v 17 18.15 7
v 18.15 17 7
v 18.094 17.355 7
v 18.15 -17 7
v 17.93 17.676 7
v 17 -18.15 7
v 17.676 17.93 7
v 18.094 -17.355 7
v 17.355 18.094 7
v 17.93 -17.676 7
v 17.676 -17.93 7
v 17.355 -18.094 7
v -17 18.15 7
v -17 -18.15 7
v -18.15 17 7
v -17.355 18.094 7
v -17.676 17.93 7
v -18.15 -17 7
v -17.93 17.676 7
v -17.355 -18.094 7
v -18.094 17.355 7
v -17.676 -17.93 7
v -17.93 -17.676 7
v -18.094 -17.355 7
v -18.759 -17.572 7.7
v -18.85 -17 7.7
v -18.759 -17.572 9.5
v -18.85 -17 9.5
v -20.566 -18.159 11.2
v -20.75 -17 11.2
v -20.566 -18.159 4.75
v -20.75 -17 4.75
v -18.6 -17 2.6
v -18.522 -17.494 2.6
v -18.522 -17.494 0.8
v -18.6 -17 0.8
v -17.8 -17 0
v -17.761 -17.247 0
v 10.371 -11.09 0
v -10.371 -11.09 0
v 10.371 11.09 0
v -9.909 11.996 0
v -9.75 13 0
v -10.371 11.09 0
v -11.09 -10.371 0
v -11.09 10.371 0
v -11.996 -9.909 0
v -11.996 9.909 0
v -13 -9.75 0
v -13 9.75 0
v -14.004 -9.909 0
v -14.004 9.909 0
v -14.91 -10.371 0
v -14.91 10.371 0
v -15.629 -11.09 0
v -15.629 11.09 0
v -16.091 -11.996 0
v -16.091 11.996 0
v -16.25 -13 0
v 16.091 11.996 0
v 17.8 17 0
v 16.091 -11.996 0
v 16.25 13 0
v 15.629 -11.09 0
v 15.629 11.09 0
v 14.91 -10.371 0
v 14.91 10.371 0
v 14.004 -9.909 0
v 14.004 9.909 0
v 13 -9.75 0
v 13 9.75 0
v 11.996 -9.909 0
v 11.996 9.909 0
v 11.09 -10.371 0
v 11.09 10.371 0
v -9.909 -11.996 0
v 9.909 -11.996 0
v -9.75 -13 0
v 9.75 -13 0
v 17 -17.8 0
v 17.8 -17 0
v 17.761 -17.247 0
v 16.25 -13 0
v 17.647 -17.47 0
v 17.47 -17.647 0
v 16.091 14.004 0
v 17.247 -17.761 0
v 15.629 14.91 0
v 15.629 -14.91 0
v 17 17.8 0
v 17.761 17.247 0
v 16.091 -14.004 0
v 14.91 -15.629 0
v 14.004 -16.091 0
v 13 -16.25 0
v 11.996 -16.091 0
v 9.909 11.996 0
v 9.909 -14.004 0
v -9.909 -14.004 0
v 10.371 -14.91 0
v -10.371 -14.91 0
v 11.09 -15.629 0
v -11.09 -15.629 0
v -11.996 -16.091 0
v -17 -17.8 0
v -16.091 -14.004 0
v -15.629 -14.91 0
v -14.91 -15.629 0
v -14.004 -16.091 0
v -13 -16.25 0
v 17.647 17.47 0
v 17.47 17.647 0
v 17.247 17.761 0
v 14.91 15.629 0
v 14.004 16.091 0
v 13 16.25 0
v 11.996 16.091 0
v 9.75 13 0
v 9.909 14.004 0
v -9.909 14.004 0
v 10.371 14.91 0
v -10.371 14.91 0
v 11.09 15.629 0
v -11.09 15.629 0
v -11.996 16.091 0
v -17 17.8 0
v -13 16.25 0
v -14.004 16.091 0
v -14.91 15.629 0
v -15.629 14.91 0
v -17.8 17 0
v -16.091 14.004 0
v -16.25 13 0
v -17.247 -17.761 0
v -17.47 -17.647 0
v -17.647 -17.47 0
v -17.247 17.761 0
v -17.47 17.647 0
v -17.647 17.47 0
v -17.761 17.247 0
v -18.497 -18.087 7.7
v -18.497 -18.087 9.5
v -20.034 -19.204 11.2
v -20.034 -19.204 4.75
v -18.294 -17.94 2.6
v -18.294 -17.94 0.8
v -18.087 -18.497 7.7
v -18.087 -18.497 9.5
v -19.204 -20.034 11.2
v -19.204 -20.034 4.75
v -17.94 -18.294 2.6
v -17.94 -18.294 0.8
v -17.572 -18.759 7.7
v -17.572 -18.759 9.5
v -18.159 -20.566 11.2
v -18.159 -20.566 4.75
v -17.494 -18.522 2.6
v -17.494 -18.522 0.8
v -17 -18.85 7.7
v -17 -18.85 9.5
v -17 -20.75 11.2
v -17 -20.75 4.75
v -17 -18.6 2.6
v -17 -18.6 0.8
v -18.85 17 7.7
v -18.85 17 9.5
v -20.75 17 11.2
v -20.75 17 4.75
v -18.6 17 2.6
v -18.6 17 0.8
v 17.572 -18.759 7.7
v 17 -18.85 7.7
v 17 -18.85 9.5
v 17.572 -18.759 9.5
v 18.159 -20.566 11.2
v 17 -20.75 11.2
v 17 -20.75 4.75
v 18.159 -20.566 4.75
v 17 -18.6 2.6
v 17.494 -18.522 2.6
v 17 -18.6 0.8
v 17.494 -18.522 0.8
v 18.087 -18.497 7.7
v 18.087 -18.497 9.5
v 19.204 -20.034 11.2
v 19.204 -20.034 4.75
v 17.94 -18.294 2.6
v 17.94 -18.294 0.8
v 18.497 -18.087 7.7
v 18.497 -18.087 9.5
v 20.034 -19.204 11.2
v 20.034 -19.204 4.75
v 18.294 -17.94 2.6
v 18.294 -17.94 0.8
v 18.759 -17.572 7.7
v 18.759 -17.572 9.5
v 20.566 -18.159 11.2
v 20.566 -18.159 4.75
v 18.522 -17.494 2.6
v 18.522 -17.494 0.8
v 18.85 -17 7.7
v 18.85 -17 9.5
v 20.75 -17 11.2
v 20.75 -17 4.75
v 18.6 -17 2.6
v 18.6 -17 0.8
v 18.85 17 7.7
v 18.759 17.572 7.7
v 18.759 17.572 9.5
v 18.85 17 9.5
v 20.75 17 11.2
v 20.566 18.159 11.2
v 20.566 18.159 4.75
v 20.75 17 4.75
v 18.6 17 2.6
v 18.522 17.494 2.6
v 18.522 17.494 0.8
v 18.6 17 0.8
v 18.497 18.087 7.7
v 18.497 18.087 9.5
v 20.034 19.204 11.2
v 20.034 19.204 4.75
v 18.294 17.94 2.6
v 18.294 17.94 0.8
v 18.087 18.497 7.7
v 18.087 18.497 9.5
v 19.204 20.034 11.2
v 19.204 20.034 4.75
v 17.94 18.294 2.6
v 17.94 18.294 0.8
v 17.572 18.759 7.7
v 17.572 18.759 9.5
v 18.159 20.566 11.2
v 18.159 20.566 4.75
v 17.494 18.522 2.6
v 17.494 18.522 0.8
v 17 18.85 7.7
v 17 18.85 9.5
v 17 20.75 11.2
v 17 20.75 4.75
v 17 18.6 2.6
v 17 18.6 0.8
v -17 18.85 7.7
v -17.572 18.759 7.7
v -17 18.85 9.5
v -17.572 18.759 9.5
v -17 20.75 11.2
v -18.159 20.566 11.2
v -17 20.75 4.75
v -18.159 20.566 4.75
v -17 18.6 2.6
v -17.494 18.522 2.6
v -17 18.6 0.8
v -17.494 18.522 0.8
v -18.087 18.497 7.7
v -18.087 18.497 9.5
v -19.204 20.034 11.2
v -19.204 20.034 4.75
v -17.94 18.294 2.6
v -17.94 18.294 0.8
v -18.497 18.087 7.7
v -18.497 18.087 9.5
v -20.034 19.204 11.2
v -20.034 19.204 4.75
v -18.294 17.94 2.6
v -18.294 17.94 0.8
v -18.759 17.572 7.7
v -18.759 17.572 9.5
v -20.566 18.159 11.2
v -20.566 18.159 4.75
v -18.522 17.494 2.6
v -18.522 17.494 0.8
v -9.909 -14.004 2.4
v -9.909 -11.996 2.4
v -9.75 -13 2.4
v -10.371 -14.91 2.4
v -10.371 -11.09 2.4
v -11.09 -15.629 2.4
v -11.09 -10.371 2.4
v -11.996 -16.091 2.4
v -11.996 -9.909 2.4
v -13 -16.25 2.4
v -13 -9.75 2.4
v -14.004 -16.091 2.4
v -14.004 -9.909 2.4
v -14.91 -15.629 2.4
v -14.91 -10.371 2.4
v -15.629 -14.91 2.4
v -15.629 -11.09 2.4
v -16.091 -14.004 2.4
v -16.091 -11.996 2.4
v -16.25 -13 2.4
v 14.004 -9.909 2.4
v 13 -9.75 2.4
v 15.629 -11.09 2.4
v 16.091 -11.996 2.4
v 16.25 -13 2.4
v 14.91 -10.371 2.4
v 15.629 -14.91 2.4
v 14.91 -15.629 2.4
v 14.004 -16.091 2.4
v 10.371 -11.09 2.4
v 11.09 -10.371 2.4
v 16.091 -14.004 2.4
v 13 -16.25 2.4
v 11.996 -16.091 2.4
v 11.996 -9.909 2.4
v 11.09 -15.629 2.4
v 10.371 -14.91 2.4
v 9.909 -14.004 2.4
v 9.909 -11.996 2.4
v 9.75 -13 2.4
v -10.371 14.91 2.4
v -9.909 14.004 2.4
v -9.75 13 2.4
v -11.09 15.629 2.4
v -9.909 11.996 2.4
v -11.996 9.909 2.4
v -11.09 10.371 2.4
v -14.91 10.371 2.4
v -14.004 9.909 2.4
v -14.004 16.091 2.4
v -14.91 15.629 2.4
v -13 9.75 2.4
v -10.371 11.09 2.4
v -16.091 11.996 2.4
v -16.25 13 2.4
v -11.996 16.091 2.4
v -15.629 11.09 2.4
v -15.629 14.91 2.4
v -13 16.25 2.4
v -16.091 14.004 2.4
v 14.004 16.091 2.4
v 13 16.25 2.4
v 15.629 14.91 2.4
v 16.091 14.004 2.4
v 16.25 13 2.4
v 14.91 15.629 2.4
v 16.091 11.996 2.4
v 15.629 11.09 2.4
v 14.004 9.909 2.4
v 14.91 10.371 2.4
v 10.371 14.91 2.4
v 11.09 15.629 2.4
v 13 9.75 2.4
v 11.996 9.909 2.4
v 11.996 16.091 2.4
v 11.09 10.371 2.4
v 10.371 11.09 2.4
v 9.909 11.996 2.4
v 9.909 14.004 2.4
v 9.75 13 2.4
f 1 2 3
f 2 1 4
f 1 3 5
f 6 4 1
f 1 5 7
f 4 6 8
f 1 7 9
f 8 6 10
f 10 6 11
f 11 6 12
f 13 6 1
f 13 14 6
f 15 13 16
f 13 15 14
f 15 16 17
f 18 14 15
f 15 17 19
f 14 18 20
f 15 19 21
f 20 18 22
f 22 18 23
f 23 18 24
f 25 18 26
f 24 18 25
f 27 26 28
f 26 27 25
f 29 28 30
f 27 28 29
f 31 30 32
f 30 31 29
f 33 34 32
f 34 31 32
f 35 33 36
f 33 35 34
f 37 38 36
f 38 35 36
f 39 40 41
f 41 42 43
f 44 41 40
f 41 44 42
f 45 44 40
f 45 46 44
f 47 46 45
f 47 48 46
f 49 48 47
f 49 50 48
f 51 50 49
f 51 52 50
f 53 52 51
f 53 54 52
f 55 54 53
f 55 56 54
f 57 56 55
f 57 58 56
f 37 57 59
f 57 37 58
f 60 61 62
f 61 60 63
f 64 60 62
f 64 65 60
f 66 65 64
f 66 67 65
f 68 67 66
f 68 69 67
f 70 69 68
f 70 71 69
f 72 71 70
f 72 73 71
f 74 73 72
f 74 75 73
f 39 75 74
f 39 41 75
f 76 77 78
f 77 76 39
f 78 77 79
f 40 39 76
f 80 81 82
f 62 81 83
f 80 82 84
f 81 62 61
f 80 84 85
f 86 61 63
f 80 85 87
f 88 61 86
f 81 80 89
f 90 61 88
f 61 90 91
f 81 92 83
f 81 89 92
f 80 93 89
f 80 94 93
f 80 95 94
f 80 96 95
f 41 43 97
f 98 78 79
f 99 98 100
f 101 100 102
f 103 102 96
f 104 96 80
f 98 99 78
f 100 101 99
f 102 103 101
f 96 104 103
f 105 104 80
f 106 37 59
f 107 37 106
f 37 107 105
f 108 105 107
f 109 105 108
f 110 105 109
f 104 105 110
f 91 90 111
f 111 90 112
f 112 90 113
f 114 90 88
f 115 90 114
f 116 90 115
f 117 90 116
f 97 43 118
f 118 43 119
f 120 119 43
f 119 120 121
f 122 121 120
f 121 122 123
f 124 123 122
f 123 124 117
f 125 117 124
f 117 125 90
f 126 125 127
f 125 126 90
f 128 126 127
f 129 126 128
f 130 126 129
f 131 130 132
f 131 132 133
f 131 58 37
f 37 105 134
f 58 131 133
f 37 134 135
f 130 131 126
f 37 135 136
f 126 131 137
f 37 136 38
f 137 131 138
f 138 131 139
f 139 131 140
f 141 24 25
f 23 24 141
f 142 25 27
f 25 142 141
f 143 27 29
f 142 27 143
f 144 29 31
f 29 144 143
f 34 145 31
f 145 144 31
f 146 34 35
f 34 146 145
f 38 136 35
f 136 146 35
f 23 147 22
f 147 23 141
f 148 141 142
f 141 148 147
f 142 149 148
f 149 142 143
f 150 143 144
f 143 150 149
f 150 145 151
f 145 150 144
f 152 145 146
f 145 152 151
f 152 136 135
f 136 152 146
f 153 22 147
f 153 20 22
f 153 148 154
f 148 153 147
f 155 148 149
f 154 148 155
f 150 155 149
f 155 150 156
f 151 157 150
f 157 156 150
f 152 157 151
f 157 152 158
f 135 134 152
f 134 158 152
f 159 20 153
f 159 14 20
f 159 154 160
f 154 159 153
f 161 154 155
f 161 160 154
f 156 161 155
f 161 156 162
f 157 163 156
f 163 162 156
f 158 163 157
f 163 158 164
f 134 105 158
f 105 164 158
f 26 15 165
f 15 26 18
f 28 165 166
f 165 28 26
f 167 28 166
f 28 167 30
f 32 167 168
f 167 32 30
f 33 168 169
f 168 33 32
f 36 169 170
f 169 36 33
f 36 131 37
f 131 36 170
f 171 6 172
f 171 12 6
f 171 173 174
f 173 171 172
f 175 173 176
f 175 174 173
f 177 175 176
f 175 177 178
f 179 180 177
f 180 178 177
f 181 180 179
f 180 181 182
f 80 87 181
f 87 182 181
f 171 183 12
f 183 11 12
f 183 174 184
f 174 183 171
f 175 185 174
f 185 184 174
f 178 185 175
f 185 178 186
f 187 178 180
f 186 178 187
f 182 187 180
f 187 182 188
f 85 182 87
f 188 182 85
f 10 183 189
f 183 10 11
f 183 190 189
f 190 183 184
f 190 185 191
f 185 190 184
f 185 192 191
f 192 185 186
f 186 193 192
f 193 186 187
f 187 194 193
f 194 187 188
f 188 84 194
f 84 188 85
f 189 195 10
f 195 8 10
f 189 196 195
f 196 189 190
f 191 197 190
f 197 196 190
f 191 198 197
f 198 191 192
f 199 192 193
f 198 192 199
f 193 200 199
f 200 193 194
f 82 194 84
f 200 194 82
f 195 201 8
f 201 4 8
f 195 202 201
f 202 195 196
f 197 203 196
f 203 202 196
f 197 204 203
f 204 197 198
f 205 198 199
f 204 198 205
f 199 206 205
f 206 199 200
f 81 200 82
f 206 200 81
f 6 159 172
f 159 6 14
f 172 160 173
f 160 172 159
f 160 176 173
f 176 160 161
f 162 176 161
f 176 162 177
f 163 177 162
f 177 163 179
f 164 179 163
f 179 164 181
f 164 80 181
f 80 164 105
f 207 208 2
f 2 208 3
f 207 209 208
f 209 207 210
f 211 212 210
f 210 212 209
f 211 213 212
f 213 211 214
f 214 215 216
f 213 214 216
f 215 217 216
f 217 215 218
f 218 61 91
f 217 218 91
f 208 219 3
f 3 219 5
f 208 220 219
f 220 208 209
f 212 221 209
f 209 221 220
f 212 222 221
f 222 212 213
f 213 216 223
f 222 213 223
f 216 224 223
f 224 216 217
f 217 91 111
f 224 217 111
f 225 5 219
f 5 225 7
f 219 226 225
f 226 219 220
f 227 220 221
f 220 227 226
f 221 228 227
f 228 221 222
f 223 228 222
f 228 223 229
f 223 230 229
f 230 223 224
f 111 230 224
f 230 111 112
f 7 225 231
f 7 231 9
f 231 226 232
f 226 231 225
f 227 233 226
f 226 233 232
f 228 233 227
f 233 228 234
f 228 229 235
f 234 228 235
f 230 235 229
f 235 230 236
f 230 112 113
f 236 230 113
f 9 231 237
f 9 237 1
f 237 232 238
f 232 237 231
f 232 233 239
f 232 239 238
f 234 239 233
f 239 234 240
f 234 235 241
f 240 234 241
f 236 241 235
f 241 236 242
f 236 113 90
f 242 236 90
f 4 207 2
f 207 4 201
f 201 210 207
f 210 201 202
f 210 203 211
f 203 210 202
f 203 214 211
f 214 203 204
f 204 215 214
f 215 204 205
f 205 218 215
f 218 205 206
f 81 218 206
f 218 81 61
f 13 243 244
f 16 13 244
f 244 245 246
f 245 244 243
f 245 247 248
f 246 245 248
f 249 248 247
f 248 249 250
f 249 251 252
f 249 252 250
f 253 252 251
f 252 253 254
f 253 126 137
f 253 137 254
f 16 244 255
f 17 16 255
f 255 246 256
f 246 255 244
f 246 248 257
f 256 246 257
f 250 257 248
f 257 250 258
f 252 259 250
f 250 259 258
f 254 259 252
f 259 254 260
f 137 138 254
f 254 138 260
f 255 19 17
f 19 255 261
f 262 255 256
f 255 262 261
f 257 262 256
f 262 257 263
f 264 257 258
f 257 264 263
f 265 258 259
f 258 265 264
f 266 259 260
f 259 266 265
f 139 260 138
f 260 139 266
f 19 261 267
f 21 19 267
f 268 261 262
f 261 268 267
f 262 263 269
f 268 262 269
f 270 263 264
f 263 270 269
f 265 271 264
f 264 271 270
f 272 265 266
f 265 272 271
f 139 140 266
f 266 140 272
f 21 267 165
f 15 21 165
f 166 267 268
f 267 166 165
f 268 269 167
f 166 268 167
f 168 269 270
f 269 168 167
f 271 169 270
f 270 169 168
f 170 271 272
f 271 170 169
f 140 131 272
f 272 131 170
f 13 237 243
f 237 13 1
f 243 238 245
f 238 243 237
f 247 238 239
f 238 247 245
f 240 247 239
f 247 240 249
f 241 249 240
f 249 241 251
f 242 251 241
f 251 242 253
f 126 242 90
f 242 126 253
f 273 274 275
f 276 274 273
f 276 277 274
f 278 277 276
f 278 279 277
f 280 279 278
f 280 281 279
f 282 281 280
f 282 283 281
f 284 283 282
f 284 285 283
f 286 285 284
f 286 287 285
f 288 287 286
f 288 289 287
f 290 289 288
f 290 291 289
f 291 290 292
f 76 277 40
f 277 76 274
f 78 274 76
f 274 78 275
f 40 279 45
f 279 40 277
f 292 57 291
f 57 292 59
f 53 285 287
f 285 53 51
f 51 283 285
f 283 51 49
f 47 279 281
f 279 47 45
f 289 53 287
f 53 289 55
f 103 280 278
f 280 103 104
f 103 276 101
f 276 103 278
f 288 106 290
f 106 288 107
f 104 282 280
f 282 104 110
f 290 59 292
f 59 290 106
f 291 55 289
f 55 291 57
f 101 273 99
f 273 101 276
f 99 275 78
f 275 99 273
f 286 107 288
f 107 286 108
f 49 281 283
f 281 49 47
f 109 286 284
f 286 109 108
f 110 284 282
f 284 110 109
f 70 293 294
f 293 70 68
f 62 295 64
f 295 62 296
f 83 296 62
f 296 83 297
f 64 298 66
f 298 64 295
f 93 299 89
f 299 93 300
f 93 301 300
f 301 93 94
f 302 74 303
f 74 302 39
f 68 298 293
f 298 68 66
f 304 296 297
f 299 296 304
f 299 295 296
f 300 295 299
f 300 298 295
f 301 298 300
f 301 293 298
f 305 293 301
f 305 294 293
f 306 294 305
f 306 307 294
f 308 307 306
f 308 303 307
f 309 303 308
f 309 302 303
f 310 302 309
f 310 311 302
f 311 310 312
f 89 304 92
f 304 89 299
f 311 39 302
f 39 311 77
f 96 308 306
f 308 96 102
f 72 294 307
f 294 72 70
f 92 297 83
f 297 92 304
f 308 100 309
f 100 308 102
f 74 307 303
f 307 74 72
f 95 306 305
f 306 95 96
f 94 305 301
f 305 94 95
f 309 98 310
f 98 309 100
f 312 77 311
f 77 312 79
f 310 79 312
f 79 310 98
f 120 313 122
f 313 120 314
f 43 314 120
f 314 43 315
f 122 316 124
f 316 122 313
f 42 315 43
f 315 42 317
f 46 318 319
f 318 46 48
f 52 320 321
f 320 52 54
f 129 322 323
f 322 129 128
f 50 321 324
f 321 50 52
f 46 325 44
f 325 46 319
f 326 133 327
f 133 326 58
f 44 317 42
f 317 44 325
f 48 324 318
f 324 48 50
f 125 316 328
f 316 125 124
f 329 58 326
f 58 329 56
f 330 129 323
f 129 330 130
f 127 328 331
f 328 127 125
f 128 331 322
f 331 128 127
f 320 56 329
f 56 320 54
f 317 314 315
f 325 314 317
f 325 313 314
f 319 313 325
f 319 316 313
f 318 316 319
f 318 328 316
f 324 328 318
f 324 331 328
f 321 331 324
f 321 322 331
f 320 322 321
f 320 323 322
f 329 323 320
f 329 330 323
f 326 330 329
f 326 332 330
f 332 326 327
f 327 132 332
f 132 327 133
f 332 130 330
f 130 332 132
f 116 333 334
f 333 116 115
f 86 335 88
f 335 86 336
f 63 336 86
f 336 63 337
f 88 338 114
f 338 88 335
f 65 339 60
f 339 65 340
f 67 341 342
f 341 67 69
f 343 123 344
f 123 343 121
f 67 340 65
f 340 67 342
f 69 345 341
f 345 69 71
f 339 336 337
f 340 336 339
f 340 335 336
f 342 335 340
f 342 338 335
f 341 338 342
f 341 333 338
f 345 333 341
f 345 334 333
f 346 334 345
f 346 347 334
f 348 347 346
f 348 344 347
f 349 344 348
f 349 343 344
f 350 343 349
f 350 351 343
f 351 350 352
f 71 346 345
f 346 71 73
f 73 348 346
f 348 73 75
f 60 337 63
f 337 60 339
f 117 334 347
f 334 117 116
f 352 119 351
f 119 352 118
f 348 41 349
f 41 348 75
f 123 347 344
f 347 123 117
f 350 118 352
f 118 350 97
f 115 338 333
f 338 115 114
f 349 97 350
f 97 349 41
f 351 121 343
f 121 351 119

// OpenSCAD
// file: ../lib/TOGGridfinityLib-v1.scad
/* Edge profile point arrays!
 *
 * Should be listed from bottom to top.
 * - X=0 is at the edge of the cell (*not the slightly narrower block*)
 * - Positive X is the offset into the left side
 * - Y=0 is the floor.
 * - Corner profile point lists start with the base
 *   and go upwards to the side.
 */

// Regular block bottom
tog_gridfinity_block_bottom_corner_profile_points = [
	[3.20, 0.00], // Right end of bottom bevel
	[2.40, 0.80],
	[2.40, 2.60],
	[0.25, 4.75], // Top of left bevel
];

// Block lip, with min(X) = 0.25
tog_gridfinity_block_lip_corner_profile_points = [
	[2.85, 0.00], // Right end of bottom bevel
	[2.15, 0.70],
	[2.15, 2.50],
	[0.25, 4.20], // Top tip
];

// Full-cell lip.   Starts at cell edge instead of 0.25 inward for blocks.
// Alternatively one could always use this and just intersect with the block hull,
// (or subtracting the inverse)
// which may be simpler especially if making blocks with a grid on top.
tog_gridfinity_full_lip_corner_profile_points = [
	[2.85, 0.00], // Right end of bottom bevel
	[2.15, 0.70],
	[2.15, 2.50],
	[0.00, 4.65], // Top tip
];

function tog_gridfinity_make_corner_extrudable_points(corner_profile_points, margin, block_height=7, corner_radius=4) = [
	[0, 0],
	for( point=corner_profile_points ) [point[0] - corner_radius, point[1]],
	[margin - corner_radius, block_height],
	[0, block_height],
];

function tog_gridfinity_reverse_list(list) = [
	for( i=[len(list)-1: -1 : 0] ) list[i]
];

/**
 * Reverses the list of points for use as a cutout at the top of a block
 * and also adds some amount of Y
 */
//function tog_gridfinity_adjusted_lip_points(point_list, delta_y=0) = [
//	for( i=[len(list)-1: -1 : 0] ) list[i]
//];

// Extrudable points for an entire block, with lip, filled to the specified height
function tog_gridfinity_make_block_with_lip_extrudable_points( block_height, floor_height=7, corner_radius=4, wall_thickness=2 ) = [
	[0, 0],
	for( point=tog_gridfinity_block_bottom_corner_profile_points ) [point[0] - corner_radius, point[1]],
	for( point=tog_gridfinity_reverse_list(tog_gridfinity_block_lip_corner_profile_points) ) [point[0] - corner_radius, point[1] + block_height],
	each (floor_height == block_height ? [] : [
		// TODO: Really want to filter this list of down-the-inside-of-the-lip points
		// based on being >= floor height.
		// If floor_height is too close to block_height, I imagine this could be a mess:
		[tog_gridfinity_block_lip_corner_profile_points[0][0] - corner_radius, max(floor_height, block_height-2)], // 2 is probably fine; really want a max. 45deg from wall thickness to innermost point in lip
		[wall_thickness+0.25 - corner_radius, max(floor_height, block_height-4)], // difference y=-2 is probably fine; really want a max. 45deg from wall thickness to innermost point in lip
		[wall_thickness+0.25 - corner_radius, floor_height+(corner_radius-wall_thickness-0.25)],
		[0, floor_height],
	]),
	[0, floor_height],,
	//[tog_gridfinity_block_lip_corner_profile_points[0][0] - corner_radius, floor_height],
];

// Create full extrudable polygon where x=0 refers to the pivot point
function tog_gridfinity_make_block_bottom_corner_extrudable_points(block_height=7, corner_radius=4) = tog_gridfinity_make_corner_extrudable_points(
	tog_gridfinity_block_bottom_corner_profile_points,
	0.25,
	block_height=block_height,
	corner_radius=corner_radius
);

module tog_gridfinity_block_from_profile_points(profile_points, block_width=42, corner_radius=4, overlap=0) {
	bottom_z = profile_points[0][1];
	top_z    = profile_points[len(profile_points)-1][1];
	for( r=[0:90:270] ) rotate([0,0,r]) {
		translate([-block_width/2+corner_radius, -block_width/2+corner_radius, 0]) {
			rotate_extrude(angle=90) {
				polygon(profile_points);
			}
		}
		translate([-block_width/2+corner_radius, 0, 0]) {
			rotate([90,0,0]) linear_extrude(block_width-2*corner_radius+overlap*2, center=true) {
				polygon(profile_points);
			}
		}
	}
	translate([0,0,(bottom_z+top_z)/2]) cube([block_width-corner_radius*2+overlap*2, block_width-corner_radius*2+overlap*2, top_z-bottom_z], center=true);
}


/**
 * Hull to be intersected with block bottoms for gridfinity compatibility.
 * Overlap=0 seems to work, but it can be set to a small value, like 1/64,
 * if OpenSCAD gets confused about exactly interfacing surfaces.
 */
module tog_gridfinity_block_bottom(height=14, gridfinity_pitch=42, corner_radius=4, overlap=0) {
	tog_gridfinity_block_from_profile_points(tog_gridfinity_make_block_bottom_corner_extrudable_points(height, corner_radius), gridfinity_pitch, corner_radius, overlap);
}

module tog_gridfinity_block_with_lip(
	height=14, floor_height=7,
	gridfinity_pitch=42, corner_radius=4, overlap=0,
	magnet_hole_diameter=6.5,
	magnet_hole_depth=2.4,
) {
	difference() {
		tog_gridfinity_block_from_profile_points(tog_gridfinity_make_block_with_lip_extrudable_points(height, floor_height, corner_radius), gridfinity_pitch, corner_radius, overlap);
		if( magnet_hole_diameter > 0 && magnet_hole_depth > 0 ) for( ym=[-1,1] ) for( xm=[-1,1] ) {
			translate([13*xm, 13*ym, 0]) cylinder(d=magnet_hole_diameter, h=magnet_hole_depth*2, center=true);
		}
	}
}
// main file
$fn = 20;
block_height = 7;
floor_height = 7;

include <../lib/TOGGridfinityLib-v1.scad>

tog_gridfinity_block_with_lip(block_height, floor_height, 42, 4);
